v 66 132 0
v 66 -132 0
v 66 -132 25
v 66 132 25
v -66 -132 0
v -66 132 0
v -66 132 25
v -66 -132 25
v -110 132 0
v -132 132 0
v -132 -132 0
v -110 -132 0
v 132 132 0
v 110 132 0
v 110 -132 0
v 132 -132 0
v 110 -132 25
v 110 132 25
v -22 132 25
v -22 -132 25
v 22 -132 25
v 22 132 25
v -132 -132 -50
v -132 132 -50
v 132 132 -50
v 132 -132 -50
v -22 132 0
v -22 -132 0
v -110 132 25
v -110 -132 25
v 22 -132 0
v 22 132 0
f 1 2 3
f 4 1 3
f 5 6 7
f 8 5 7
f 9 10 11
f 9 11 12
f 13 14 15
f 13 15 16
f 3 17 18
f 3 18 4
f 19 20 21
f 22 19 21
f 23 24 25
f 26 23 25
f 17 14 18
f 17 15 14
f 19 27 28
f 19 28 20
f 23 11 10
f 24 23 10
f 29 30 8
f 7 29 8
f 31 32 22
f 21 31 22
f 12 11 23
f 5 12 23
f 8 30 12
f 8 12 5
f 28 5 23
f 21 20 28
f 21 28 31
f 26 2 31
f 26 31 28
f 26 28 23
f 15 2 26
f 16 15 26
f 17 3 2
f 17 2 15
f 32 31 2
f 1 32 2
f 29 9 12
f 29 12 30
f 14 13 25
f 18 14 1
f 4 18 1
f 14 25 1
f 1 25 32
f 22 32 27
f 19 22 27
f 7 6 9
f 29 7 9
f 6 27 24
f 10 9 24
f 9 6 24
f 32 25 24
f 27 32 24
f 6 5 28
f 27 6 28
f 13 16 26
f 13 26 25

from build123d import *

# Parameters (mm, degrees)
F0_W      = 44
F0_H      = 44
F1_DEPTH  = 25
F0_W_2    = 264
F0_H_2    = 264
F4_DEPTH  = 50
F3_FACE_W = 44
F3_FACE_H = 25
F1_FACE_W = 44
F1_FACE_H = 25
F2_FACE_W = 44
F2_FACE_H = 25
F5_DEPTH  = 44
F6_DEPTH  = 22


with BuildPart() as f1:
    # F0 (on Top) → F1 (new body)
    with BuildSketch(Plane.XY):
        with Locations((-88, 0)):
            Rectangle(F0_W, F0_H)
    extrude(amount=F1_DEPTH)


with BuildPart() as f1b:
    # F0 (on Top) → F1, piece 2 (new body)
    with BuildSketch(Plane.XY):
        with Locations((-88, 88)):
            Rectangle(F0_W, F0_H)
    extrude(amount=F1_DEPTH)


with BuildPart() as f1c:
    # F0 (on Top) → F1, piece 3 (new body)
    with BuildSketch(Plane.XY):
        with Locations((0, 88)):
            Rectangle(F0_W, F0_H)
    extrude(amount=F1_DEPTH)


with BuildPart() as f1d:
    # F0 (on Top) → F1, piece 4 (new body)
    with BuildSketch(Plane.XY):
        Rectangle(F0_W, F0_H)
    extrude(amount=F1_DEPTH)


with BuildPart() as f2_1:
    # F2: instance of F1
    add(f1.part.mirror(Plane.YZ))


with BuildPart() as f2_2:
    # F2: instance of F1b
    add(f1b.part.mirror(Plane.YZ))


with BuildPart() as f3_1:
    # F3: instance of F1b
    add(f1b.part.mirror(Plane.XZ))


with BuildPart() as f3_2:
    # F3: instance of F1c
    add(f1c.part.mirror(Plane.XZ))


with BuildPart() as f3_3:
    # F3: instance of F2_2
    add(f2_2.part.mirror(Plane.XZ))


with BuildPart() as f4:
    # F0 (on Top) → F4 (new body)
    with BuildSketch(Plane.XY):
        Rectangle(F0_W_2, F0_H_2)
        with Locations((-88, 0)):
            Rectangle(F0_W, F0_H, mode=Mode.SUBTRACT)
        with Locations((-88, 88)):
            Rectangle(F0_W, F0_H, mode=Mode.SUBTRACT)
        Rectangle(F0_W, F0_H, mode=Mode.SUBTRACT)
        with Locations((0, 88)):
            Rectangle(F0_W, F0_H, mode=Mode.SUBTRACT)
        with Locations((-88, 0)):
            Rectangle(F0_W, F0_H)
        Rectangle(F0_W, F0_H)
        with Locations((-88, 88)):
            Rectangle(F0_W, F0_H)
        with Locations((0, 88)):
            Rectangle(F0_W, F0_H)
    extrude(amount=-F4_DEPTH)


with BuildPart() as f1_1:
    add(f1.part)

    add(f1b.part)  # F5 merges F1b

    add(f1c.part)  # F5 merges F1c

    add(f1d.part)  # F5 merges F1d

    add(f2_1.part)  # F5 merges F2_1

    add(f2_2.part)  # F5 merges F2_2

    add(f3_1.part)  # F5 merges F3_1

    add(f3_2.part)  # F5 merges F3_2

    add(f3_3.part)  # F5 merges F3_3

    add(f4.part)  # F5 merges F4
    # F3_face (on face) + F1_face (on face) + F2_face (on face) → F5 (join)
    with BuildSketch(Plane(origin=(-88, -66, 12.5), x_dir=(-1, 0, 0), z_dir=(0, 1, 0))):
        Rectangle(F3_FACE_W, F3_FACE_H)
        with Locations((-88, 0)):
            Rectangle(F3_FACE_W, F3_FACE_H)
        with Locations((-176, 0)):
            Rectangle(F3_FACE_W, F3_FACE_H)
    with BuildSketch(Plane(origin=(-88, 22, 12.5), x_dir=(-1, 0, 0), z_dir=(0, 1, 0))):
        Rectangle(F1_FACE_W, F1_FACE_H)
        with Locations((-88, 0)):
            Rectangle(F1_FACE_W, F1_FACE_H)
    with BuildSketch(Plane(origin=(88, 22, 12.5), x_dir=(-1, 0, 0), z_dir=(0, 1, 0))):
        Rectangle(F2_FACE_W, F2_FACE_H)
    extrude(amount=F5_DEPTH)

    # F6 (add, symmetric): faces of the model
    f6_faces = [f1_1.faces().sort_by_distance(p)[0] for p in [
        (-88, -110, 12.5),
        (0, -110, 12.5),
        (88, -110, 12.5),
        (-88, 110, 12.5),
        (0, 110, 12.5),
        (88, 110, 12.5),
    ]]
    extrude(f6_faces, amount=F6_DEPTH, both=True, dir=(0, -1, 0))


solid = f1_1.part
